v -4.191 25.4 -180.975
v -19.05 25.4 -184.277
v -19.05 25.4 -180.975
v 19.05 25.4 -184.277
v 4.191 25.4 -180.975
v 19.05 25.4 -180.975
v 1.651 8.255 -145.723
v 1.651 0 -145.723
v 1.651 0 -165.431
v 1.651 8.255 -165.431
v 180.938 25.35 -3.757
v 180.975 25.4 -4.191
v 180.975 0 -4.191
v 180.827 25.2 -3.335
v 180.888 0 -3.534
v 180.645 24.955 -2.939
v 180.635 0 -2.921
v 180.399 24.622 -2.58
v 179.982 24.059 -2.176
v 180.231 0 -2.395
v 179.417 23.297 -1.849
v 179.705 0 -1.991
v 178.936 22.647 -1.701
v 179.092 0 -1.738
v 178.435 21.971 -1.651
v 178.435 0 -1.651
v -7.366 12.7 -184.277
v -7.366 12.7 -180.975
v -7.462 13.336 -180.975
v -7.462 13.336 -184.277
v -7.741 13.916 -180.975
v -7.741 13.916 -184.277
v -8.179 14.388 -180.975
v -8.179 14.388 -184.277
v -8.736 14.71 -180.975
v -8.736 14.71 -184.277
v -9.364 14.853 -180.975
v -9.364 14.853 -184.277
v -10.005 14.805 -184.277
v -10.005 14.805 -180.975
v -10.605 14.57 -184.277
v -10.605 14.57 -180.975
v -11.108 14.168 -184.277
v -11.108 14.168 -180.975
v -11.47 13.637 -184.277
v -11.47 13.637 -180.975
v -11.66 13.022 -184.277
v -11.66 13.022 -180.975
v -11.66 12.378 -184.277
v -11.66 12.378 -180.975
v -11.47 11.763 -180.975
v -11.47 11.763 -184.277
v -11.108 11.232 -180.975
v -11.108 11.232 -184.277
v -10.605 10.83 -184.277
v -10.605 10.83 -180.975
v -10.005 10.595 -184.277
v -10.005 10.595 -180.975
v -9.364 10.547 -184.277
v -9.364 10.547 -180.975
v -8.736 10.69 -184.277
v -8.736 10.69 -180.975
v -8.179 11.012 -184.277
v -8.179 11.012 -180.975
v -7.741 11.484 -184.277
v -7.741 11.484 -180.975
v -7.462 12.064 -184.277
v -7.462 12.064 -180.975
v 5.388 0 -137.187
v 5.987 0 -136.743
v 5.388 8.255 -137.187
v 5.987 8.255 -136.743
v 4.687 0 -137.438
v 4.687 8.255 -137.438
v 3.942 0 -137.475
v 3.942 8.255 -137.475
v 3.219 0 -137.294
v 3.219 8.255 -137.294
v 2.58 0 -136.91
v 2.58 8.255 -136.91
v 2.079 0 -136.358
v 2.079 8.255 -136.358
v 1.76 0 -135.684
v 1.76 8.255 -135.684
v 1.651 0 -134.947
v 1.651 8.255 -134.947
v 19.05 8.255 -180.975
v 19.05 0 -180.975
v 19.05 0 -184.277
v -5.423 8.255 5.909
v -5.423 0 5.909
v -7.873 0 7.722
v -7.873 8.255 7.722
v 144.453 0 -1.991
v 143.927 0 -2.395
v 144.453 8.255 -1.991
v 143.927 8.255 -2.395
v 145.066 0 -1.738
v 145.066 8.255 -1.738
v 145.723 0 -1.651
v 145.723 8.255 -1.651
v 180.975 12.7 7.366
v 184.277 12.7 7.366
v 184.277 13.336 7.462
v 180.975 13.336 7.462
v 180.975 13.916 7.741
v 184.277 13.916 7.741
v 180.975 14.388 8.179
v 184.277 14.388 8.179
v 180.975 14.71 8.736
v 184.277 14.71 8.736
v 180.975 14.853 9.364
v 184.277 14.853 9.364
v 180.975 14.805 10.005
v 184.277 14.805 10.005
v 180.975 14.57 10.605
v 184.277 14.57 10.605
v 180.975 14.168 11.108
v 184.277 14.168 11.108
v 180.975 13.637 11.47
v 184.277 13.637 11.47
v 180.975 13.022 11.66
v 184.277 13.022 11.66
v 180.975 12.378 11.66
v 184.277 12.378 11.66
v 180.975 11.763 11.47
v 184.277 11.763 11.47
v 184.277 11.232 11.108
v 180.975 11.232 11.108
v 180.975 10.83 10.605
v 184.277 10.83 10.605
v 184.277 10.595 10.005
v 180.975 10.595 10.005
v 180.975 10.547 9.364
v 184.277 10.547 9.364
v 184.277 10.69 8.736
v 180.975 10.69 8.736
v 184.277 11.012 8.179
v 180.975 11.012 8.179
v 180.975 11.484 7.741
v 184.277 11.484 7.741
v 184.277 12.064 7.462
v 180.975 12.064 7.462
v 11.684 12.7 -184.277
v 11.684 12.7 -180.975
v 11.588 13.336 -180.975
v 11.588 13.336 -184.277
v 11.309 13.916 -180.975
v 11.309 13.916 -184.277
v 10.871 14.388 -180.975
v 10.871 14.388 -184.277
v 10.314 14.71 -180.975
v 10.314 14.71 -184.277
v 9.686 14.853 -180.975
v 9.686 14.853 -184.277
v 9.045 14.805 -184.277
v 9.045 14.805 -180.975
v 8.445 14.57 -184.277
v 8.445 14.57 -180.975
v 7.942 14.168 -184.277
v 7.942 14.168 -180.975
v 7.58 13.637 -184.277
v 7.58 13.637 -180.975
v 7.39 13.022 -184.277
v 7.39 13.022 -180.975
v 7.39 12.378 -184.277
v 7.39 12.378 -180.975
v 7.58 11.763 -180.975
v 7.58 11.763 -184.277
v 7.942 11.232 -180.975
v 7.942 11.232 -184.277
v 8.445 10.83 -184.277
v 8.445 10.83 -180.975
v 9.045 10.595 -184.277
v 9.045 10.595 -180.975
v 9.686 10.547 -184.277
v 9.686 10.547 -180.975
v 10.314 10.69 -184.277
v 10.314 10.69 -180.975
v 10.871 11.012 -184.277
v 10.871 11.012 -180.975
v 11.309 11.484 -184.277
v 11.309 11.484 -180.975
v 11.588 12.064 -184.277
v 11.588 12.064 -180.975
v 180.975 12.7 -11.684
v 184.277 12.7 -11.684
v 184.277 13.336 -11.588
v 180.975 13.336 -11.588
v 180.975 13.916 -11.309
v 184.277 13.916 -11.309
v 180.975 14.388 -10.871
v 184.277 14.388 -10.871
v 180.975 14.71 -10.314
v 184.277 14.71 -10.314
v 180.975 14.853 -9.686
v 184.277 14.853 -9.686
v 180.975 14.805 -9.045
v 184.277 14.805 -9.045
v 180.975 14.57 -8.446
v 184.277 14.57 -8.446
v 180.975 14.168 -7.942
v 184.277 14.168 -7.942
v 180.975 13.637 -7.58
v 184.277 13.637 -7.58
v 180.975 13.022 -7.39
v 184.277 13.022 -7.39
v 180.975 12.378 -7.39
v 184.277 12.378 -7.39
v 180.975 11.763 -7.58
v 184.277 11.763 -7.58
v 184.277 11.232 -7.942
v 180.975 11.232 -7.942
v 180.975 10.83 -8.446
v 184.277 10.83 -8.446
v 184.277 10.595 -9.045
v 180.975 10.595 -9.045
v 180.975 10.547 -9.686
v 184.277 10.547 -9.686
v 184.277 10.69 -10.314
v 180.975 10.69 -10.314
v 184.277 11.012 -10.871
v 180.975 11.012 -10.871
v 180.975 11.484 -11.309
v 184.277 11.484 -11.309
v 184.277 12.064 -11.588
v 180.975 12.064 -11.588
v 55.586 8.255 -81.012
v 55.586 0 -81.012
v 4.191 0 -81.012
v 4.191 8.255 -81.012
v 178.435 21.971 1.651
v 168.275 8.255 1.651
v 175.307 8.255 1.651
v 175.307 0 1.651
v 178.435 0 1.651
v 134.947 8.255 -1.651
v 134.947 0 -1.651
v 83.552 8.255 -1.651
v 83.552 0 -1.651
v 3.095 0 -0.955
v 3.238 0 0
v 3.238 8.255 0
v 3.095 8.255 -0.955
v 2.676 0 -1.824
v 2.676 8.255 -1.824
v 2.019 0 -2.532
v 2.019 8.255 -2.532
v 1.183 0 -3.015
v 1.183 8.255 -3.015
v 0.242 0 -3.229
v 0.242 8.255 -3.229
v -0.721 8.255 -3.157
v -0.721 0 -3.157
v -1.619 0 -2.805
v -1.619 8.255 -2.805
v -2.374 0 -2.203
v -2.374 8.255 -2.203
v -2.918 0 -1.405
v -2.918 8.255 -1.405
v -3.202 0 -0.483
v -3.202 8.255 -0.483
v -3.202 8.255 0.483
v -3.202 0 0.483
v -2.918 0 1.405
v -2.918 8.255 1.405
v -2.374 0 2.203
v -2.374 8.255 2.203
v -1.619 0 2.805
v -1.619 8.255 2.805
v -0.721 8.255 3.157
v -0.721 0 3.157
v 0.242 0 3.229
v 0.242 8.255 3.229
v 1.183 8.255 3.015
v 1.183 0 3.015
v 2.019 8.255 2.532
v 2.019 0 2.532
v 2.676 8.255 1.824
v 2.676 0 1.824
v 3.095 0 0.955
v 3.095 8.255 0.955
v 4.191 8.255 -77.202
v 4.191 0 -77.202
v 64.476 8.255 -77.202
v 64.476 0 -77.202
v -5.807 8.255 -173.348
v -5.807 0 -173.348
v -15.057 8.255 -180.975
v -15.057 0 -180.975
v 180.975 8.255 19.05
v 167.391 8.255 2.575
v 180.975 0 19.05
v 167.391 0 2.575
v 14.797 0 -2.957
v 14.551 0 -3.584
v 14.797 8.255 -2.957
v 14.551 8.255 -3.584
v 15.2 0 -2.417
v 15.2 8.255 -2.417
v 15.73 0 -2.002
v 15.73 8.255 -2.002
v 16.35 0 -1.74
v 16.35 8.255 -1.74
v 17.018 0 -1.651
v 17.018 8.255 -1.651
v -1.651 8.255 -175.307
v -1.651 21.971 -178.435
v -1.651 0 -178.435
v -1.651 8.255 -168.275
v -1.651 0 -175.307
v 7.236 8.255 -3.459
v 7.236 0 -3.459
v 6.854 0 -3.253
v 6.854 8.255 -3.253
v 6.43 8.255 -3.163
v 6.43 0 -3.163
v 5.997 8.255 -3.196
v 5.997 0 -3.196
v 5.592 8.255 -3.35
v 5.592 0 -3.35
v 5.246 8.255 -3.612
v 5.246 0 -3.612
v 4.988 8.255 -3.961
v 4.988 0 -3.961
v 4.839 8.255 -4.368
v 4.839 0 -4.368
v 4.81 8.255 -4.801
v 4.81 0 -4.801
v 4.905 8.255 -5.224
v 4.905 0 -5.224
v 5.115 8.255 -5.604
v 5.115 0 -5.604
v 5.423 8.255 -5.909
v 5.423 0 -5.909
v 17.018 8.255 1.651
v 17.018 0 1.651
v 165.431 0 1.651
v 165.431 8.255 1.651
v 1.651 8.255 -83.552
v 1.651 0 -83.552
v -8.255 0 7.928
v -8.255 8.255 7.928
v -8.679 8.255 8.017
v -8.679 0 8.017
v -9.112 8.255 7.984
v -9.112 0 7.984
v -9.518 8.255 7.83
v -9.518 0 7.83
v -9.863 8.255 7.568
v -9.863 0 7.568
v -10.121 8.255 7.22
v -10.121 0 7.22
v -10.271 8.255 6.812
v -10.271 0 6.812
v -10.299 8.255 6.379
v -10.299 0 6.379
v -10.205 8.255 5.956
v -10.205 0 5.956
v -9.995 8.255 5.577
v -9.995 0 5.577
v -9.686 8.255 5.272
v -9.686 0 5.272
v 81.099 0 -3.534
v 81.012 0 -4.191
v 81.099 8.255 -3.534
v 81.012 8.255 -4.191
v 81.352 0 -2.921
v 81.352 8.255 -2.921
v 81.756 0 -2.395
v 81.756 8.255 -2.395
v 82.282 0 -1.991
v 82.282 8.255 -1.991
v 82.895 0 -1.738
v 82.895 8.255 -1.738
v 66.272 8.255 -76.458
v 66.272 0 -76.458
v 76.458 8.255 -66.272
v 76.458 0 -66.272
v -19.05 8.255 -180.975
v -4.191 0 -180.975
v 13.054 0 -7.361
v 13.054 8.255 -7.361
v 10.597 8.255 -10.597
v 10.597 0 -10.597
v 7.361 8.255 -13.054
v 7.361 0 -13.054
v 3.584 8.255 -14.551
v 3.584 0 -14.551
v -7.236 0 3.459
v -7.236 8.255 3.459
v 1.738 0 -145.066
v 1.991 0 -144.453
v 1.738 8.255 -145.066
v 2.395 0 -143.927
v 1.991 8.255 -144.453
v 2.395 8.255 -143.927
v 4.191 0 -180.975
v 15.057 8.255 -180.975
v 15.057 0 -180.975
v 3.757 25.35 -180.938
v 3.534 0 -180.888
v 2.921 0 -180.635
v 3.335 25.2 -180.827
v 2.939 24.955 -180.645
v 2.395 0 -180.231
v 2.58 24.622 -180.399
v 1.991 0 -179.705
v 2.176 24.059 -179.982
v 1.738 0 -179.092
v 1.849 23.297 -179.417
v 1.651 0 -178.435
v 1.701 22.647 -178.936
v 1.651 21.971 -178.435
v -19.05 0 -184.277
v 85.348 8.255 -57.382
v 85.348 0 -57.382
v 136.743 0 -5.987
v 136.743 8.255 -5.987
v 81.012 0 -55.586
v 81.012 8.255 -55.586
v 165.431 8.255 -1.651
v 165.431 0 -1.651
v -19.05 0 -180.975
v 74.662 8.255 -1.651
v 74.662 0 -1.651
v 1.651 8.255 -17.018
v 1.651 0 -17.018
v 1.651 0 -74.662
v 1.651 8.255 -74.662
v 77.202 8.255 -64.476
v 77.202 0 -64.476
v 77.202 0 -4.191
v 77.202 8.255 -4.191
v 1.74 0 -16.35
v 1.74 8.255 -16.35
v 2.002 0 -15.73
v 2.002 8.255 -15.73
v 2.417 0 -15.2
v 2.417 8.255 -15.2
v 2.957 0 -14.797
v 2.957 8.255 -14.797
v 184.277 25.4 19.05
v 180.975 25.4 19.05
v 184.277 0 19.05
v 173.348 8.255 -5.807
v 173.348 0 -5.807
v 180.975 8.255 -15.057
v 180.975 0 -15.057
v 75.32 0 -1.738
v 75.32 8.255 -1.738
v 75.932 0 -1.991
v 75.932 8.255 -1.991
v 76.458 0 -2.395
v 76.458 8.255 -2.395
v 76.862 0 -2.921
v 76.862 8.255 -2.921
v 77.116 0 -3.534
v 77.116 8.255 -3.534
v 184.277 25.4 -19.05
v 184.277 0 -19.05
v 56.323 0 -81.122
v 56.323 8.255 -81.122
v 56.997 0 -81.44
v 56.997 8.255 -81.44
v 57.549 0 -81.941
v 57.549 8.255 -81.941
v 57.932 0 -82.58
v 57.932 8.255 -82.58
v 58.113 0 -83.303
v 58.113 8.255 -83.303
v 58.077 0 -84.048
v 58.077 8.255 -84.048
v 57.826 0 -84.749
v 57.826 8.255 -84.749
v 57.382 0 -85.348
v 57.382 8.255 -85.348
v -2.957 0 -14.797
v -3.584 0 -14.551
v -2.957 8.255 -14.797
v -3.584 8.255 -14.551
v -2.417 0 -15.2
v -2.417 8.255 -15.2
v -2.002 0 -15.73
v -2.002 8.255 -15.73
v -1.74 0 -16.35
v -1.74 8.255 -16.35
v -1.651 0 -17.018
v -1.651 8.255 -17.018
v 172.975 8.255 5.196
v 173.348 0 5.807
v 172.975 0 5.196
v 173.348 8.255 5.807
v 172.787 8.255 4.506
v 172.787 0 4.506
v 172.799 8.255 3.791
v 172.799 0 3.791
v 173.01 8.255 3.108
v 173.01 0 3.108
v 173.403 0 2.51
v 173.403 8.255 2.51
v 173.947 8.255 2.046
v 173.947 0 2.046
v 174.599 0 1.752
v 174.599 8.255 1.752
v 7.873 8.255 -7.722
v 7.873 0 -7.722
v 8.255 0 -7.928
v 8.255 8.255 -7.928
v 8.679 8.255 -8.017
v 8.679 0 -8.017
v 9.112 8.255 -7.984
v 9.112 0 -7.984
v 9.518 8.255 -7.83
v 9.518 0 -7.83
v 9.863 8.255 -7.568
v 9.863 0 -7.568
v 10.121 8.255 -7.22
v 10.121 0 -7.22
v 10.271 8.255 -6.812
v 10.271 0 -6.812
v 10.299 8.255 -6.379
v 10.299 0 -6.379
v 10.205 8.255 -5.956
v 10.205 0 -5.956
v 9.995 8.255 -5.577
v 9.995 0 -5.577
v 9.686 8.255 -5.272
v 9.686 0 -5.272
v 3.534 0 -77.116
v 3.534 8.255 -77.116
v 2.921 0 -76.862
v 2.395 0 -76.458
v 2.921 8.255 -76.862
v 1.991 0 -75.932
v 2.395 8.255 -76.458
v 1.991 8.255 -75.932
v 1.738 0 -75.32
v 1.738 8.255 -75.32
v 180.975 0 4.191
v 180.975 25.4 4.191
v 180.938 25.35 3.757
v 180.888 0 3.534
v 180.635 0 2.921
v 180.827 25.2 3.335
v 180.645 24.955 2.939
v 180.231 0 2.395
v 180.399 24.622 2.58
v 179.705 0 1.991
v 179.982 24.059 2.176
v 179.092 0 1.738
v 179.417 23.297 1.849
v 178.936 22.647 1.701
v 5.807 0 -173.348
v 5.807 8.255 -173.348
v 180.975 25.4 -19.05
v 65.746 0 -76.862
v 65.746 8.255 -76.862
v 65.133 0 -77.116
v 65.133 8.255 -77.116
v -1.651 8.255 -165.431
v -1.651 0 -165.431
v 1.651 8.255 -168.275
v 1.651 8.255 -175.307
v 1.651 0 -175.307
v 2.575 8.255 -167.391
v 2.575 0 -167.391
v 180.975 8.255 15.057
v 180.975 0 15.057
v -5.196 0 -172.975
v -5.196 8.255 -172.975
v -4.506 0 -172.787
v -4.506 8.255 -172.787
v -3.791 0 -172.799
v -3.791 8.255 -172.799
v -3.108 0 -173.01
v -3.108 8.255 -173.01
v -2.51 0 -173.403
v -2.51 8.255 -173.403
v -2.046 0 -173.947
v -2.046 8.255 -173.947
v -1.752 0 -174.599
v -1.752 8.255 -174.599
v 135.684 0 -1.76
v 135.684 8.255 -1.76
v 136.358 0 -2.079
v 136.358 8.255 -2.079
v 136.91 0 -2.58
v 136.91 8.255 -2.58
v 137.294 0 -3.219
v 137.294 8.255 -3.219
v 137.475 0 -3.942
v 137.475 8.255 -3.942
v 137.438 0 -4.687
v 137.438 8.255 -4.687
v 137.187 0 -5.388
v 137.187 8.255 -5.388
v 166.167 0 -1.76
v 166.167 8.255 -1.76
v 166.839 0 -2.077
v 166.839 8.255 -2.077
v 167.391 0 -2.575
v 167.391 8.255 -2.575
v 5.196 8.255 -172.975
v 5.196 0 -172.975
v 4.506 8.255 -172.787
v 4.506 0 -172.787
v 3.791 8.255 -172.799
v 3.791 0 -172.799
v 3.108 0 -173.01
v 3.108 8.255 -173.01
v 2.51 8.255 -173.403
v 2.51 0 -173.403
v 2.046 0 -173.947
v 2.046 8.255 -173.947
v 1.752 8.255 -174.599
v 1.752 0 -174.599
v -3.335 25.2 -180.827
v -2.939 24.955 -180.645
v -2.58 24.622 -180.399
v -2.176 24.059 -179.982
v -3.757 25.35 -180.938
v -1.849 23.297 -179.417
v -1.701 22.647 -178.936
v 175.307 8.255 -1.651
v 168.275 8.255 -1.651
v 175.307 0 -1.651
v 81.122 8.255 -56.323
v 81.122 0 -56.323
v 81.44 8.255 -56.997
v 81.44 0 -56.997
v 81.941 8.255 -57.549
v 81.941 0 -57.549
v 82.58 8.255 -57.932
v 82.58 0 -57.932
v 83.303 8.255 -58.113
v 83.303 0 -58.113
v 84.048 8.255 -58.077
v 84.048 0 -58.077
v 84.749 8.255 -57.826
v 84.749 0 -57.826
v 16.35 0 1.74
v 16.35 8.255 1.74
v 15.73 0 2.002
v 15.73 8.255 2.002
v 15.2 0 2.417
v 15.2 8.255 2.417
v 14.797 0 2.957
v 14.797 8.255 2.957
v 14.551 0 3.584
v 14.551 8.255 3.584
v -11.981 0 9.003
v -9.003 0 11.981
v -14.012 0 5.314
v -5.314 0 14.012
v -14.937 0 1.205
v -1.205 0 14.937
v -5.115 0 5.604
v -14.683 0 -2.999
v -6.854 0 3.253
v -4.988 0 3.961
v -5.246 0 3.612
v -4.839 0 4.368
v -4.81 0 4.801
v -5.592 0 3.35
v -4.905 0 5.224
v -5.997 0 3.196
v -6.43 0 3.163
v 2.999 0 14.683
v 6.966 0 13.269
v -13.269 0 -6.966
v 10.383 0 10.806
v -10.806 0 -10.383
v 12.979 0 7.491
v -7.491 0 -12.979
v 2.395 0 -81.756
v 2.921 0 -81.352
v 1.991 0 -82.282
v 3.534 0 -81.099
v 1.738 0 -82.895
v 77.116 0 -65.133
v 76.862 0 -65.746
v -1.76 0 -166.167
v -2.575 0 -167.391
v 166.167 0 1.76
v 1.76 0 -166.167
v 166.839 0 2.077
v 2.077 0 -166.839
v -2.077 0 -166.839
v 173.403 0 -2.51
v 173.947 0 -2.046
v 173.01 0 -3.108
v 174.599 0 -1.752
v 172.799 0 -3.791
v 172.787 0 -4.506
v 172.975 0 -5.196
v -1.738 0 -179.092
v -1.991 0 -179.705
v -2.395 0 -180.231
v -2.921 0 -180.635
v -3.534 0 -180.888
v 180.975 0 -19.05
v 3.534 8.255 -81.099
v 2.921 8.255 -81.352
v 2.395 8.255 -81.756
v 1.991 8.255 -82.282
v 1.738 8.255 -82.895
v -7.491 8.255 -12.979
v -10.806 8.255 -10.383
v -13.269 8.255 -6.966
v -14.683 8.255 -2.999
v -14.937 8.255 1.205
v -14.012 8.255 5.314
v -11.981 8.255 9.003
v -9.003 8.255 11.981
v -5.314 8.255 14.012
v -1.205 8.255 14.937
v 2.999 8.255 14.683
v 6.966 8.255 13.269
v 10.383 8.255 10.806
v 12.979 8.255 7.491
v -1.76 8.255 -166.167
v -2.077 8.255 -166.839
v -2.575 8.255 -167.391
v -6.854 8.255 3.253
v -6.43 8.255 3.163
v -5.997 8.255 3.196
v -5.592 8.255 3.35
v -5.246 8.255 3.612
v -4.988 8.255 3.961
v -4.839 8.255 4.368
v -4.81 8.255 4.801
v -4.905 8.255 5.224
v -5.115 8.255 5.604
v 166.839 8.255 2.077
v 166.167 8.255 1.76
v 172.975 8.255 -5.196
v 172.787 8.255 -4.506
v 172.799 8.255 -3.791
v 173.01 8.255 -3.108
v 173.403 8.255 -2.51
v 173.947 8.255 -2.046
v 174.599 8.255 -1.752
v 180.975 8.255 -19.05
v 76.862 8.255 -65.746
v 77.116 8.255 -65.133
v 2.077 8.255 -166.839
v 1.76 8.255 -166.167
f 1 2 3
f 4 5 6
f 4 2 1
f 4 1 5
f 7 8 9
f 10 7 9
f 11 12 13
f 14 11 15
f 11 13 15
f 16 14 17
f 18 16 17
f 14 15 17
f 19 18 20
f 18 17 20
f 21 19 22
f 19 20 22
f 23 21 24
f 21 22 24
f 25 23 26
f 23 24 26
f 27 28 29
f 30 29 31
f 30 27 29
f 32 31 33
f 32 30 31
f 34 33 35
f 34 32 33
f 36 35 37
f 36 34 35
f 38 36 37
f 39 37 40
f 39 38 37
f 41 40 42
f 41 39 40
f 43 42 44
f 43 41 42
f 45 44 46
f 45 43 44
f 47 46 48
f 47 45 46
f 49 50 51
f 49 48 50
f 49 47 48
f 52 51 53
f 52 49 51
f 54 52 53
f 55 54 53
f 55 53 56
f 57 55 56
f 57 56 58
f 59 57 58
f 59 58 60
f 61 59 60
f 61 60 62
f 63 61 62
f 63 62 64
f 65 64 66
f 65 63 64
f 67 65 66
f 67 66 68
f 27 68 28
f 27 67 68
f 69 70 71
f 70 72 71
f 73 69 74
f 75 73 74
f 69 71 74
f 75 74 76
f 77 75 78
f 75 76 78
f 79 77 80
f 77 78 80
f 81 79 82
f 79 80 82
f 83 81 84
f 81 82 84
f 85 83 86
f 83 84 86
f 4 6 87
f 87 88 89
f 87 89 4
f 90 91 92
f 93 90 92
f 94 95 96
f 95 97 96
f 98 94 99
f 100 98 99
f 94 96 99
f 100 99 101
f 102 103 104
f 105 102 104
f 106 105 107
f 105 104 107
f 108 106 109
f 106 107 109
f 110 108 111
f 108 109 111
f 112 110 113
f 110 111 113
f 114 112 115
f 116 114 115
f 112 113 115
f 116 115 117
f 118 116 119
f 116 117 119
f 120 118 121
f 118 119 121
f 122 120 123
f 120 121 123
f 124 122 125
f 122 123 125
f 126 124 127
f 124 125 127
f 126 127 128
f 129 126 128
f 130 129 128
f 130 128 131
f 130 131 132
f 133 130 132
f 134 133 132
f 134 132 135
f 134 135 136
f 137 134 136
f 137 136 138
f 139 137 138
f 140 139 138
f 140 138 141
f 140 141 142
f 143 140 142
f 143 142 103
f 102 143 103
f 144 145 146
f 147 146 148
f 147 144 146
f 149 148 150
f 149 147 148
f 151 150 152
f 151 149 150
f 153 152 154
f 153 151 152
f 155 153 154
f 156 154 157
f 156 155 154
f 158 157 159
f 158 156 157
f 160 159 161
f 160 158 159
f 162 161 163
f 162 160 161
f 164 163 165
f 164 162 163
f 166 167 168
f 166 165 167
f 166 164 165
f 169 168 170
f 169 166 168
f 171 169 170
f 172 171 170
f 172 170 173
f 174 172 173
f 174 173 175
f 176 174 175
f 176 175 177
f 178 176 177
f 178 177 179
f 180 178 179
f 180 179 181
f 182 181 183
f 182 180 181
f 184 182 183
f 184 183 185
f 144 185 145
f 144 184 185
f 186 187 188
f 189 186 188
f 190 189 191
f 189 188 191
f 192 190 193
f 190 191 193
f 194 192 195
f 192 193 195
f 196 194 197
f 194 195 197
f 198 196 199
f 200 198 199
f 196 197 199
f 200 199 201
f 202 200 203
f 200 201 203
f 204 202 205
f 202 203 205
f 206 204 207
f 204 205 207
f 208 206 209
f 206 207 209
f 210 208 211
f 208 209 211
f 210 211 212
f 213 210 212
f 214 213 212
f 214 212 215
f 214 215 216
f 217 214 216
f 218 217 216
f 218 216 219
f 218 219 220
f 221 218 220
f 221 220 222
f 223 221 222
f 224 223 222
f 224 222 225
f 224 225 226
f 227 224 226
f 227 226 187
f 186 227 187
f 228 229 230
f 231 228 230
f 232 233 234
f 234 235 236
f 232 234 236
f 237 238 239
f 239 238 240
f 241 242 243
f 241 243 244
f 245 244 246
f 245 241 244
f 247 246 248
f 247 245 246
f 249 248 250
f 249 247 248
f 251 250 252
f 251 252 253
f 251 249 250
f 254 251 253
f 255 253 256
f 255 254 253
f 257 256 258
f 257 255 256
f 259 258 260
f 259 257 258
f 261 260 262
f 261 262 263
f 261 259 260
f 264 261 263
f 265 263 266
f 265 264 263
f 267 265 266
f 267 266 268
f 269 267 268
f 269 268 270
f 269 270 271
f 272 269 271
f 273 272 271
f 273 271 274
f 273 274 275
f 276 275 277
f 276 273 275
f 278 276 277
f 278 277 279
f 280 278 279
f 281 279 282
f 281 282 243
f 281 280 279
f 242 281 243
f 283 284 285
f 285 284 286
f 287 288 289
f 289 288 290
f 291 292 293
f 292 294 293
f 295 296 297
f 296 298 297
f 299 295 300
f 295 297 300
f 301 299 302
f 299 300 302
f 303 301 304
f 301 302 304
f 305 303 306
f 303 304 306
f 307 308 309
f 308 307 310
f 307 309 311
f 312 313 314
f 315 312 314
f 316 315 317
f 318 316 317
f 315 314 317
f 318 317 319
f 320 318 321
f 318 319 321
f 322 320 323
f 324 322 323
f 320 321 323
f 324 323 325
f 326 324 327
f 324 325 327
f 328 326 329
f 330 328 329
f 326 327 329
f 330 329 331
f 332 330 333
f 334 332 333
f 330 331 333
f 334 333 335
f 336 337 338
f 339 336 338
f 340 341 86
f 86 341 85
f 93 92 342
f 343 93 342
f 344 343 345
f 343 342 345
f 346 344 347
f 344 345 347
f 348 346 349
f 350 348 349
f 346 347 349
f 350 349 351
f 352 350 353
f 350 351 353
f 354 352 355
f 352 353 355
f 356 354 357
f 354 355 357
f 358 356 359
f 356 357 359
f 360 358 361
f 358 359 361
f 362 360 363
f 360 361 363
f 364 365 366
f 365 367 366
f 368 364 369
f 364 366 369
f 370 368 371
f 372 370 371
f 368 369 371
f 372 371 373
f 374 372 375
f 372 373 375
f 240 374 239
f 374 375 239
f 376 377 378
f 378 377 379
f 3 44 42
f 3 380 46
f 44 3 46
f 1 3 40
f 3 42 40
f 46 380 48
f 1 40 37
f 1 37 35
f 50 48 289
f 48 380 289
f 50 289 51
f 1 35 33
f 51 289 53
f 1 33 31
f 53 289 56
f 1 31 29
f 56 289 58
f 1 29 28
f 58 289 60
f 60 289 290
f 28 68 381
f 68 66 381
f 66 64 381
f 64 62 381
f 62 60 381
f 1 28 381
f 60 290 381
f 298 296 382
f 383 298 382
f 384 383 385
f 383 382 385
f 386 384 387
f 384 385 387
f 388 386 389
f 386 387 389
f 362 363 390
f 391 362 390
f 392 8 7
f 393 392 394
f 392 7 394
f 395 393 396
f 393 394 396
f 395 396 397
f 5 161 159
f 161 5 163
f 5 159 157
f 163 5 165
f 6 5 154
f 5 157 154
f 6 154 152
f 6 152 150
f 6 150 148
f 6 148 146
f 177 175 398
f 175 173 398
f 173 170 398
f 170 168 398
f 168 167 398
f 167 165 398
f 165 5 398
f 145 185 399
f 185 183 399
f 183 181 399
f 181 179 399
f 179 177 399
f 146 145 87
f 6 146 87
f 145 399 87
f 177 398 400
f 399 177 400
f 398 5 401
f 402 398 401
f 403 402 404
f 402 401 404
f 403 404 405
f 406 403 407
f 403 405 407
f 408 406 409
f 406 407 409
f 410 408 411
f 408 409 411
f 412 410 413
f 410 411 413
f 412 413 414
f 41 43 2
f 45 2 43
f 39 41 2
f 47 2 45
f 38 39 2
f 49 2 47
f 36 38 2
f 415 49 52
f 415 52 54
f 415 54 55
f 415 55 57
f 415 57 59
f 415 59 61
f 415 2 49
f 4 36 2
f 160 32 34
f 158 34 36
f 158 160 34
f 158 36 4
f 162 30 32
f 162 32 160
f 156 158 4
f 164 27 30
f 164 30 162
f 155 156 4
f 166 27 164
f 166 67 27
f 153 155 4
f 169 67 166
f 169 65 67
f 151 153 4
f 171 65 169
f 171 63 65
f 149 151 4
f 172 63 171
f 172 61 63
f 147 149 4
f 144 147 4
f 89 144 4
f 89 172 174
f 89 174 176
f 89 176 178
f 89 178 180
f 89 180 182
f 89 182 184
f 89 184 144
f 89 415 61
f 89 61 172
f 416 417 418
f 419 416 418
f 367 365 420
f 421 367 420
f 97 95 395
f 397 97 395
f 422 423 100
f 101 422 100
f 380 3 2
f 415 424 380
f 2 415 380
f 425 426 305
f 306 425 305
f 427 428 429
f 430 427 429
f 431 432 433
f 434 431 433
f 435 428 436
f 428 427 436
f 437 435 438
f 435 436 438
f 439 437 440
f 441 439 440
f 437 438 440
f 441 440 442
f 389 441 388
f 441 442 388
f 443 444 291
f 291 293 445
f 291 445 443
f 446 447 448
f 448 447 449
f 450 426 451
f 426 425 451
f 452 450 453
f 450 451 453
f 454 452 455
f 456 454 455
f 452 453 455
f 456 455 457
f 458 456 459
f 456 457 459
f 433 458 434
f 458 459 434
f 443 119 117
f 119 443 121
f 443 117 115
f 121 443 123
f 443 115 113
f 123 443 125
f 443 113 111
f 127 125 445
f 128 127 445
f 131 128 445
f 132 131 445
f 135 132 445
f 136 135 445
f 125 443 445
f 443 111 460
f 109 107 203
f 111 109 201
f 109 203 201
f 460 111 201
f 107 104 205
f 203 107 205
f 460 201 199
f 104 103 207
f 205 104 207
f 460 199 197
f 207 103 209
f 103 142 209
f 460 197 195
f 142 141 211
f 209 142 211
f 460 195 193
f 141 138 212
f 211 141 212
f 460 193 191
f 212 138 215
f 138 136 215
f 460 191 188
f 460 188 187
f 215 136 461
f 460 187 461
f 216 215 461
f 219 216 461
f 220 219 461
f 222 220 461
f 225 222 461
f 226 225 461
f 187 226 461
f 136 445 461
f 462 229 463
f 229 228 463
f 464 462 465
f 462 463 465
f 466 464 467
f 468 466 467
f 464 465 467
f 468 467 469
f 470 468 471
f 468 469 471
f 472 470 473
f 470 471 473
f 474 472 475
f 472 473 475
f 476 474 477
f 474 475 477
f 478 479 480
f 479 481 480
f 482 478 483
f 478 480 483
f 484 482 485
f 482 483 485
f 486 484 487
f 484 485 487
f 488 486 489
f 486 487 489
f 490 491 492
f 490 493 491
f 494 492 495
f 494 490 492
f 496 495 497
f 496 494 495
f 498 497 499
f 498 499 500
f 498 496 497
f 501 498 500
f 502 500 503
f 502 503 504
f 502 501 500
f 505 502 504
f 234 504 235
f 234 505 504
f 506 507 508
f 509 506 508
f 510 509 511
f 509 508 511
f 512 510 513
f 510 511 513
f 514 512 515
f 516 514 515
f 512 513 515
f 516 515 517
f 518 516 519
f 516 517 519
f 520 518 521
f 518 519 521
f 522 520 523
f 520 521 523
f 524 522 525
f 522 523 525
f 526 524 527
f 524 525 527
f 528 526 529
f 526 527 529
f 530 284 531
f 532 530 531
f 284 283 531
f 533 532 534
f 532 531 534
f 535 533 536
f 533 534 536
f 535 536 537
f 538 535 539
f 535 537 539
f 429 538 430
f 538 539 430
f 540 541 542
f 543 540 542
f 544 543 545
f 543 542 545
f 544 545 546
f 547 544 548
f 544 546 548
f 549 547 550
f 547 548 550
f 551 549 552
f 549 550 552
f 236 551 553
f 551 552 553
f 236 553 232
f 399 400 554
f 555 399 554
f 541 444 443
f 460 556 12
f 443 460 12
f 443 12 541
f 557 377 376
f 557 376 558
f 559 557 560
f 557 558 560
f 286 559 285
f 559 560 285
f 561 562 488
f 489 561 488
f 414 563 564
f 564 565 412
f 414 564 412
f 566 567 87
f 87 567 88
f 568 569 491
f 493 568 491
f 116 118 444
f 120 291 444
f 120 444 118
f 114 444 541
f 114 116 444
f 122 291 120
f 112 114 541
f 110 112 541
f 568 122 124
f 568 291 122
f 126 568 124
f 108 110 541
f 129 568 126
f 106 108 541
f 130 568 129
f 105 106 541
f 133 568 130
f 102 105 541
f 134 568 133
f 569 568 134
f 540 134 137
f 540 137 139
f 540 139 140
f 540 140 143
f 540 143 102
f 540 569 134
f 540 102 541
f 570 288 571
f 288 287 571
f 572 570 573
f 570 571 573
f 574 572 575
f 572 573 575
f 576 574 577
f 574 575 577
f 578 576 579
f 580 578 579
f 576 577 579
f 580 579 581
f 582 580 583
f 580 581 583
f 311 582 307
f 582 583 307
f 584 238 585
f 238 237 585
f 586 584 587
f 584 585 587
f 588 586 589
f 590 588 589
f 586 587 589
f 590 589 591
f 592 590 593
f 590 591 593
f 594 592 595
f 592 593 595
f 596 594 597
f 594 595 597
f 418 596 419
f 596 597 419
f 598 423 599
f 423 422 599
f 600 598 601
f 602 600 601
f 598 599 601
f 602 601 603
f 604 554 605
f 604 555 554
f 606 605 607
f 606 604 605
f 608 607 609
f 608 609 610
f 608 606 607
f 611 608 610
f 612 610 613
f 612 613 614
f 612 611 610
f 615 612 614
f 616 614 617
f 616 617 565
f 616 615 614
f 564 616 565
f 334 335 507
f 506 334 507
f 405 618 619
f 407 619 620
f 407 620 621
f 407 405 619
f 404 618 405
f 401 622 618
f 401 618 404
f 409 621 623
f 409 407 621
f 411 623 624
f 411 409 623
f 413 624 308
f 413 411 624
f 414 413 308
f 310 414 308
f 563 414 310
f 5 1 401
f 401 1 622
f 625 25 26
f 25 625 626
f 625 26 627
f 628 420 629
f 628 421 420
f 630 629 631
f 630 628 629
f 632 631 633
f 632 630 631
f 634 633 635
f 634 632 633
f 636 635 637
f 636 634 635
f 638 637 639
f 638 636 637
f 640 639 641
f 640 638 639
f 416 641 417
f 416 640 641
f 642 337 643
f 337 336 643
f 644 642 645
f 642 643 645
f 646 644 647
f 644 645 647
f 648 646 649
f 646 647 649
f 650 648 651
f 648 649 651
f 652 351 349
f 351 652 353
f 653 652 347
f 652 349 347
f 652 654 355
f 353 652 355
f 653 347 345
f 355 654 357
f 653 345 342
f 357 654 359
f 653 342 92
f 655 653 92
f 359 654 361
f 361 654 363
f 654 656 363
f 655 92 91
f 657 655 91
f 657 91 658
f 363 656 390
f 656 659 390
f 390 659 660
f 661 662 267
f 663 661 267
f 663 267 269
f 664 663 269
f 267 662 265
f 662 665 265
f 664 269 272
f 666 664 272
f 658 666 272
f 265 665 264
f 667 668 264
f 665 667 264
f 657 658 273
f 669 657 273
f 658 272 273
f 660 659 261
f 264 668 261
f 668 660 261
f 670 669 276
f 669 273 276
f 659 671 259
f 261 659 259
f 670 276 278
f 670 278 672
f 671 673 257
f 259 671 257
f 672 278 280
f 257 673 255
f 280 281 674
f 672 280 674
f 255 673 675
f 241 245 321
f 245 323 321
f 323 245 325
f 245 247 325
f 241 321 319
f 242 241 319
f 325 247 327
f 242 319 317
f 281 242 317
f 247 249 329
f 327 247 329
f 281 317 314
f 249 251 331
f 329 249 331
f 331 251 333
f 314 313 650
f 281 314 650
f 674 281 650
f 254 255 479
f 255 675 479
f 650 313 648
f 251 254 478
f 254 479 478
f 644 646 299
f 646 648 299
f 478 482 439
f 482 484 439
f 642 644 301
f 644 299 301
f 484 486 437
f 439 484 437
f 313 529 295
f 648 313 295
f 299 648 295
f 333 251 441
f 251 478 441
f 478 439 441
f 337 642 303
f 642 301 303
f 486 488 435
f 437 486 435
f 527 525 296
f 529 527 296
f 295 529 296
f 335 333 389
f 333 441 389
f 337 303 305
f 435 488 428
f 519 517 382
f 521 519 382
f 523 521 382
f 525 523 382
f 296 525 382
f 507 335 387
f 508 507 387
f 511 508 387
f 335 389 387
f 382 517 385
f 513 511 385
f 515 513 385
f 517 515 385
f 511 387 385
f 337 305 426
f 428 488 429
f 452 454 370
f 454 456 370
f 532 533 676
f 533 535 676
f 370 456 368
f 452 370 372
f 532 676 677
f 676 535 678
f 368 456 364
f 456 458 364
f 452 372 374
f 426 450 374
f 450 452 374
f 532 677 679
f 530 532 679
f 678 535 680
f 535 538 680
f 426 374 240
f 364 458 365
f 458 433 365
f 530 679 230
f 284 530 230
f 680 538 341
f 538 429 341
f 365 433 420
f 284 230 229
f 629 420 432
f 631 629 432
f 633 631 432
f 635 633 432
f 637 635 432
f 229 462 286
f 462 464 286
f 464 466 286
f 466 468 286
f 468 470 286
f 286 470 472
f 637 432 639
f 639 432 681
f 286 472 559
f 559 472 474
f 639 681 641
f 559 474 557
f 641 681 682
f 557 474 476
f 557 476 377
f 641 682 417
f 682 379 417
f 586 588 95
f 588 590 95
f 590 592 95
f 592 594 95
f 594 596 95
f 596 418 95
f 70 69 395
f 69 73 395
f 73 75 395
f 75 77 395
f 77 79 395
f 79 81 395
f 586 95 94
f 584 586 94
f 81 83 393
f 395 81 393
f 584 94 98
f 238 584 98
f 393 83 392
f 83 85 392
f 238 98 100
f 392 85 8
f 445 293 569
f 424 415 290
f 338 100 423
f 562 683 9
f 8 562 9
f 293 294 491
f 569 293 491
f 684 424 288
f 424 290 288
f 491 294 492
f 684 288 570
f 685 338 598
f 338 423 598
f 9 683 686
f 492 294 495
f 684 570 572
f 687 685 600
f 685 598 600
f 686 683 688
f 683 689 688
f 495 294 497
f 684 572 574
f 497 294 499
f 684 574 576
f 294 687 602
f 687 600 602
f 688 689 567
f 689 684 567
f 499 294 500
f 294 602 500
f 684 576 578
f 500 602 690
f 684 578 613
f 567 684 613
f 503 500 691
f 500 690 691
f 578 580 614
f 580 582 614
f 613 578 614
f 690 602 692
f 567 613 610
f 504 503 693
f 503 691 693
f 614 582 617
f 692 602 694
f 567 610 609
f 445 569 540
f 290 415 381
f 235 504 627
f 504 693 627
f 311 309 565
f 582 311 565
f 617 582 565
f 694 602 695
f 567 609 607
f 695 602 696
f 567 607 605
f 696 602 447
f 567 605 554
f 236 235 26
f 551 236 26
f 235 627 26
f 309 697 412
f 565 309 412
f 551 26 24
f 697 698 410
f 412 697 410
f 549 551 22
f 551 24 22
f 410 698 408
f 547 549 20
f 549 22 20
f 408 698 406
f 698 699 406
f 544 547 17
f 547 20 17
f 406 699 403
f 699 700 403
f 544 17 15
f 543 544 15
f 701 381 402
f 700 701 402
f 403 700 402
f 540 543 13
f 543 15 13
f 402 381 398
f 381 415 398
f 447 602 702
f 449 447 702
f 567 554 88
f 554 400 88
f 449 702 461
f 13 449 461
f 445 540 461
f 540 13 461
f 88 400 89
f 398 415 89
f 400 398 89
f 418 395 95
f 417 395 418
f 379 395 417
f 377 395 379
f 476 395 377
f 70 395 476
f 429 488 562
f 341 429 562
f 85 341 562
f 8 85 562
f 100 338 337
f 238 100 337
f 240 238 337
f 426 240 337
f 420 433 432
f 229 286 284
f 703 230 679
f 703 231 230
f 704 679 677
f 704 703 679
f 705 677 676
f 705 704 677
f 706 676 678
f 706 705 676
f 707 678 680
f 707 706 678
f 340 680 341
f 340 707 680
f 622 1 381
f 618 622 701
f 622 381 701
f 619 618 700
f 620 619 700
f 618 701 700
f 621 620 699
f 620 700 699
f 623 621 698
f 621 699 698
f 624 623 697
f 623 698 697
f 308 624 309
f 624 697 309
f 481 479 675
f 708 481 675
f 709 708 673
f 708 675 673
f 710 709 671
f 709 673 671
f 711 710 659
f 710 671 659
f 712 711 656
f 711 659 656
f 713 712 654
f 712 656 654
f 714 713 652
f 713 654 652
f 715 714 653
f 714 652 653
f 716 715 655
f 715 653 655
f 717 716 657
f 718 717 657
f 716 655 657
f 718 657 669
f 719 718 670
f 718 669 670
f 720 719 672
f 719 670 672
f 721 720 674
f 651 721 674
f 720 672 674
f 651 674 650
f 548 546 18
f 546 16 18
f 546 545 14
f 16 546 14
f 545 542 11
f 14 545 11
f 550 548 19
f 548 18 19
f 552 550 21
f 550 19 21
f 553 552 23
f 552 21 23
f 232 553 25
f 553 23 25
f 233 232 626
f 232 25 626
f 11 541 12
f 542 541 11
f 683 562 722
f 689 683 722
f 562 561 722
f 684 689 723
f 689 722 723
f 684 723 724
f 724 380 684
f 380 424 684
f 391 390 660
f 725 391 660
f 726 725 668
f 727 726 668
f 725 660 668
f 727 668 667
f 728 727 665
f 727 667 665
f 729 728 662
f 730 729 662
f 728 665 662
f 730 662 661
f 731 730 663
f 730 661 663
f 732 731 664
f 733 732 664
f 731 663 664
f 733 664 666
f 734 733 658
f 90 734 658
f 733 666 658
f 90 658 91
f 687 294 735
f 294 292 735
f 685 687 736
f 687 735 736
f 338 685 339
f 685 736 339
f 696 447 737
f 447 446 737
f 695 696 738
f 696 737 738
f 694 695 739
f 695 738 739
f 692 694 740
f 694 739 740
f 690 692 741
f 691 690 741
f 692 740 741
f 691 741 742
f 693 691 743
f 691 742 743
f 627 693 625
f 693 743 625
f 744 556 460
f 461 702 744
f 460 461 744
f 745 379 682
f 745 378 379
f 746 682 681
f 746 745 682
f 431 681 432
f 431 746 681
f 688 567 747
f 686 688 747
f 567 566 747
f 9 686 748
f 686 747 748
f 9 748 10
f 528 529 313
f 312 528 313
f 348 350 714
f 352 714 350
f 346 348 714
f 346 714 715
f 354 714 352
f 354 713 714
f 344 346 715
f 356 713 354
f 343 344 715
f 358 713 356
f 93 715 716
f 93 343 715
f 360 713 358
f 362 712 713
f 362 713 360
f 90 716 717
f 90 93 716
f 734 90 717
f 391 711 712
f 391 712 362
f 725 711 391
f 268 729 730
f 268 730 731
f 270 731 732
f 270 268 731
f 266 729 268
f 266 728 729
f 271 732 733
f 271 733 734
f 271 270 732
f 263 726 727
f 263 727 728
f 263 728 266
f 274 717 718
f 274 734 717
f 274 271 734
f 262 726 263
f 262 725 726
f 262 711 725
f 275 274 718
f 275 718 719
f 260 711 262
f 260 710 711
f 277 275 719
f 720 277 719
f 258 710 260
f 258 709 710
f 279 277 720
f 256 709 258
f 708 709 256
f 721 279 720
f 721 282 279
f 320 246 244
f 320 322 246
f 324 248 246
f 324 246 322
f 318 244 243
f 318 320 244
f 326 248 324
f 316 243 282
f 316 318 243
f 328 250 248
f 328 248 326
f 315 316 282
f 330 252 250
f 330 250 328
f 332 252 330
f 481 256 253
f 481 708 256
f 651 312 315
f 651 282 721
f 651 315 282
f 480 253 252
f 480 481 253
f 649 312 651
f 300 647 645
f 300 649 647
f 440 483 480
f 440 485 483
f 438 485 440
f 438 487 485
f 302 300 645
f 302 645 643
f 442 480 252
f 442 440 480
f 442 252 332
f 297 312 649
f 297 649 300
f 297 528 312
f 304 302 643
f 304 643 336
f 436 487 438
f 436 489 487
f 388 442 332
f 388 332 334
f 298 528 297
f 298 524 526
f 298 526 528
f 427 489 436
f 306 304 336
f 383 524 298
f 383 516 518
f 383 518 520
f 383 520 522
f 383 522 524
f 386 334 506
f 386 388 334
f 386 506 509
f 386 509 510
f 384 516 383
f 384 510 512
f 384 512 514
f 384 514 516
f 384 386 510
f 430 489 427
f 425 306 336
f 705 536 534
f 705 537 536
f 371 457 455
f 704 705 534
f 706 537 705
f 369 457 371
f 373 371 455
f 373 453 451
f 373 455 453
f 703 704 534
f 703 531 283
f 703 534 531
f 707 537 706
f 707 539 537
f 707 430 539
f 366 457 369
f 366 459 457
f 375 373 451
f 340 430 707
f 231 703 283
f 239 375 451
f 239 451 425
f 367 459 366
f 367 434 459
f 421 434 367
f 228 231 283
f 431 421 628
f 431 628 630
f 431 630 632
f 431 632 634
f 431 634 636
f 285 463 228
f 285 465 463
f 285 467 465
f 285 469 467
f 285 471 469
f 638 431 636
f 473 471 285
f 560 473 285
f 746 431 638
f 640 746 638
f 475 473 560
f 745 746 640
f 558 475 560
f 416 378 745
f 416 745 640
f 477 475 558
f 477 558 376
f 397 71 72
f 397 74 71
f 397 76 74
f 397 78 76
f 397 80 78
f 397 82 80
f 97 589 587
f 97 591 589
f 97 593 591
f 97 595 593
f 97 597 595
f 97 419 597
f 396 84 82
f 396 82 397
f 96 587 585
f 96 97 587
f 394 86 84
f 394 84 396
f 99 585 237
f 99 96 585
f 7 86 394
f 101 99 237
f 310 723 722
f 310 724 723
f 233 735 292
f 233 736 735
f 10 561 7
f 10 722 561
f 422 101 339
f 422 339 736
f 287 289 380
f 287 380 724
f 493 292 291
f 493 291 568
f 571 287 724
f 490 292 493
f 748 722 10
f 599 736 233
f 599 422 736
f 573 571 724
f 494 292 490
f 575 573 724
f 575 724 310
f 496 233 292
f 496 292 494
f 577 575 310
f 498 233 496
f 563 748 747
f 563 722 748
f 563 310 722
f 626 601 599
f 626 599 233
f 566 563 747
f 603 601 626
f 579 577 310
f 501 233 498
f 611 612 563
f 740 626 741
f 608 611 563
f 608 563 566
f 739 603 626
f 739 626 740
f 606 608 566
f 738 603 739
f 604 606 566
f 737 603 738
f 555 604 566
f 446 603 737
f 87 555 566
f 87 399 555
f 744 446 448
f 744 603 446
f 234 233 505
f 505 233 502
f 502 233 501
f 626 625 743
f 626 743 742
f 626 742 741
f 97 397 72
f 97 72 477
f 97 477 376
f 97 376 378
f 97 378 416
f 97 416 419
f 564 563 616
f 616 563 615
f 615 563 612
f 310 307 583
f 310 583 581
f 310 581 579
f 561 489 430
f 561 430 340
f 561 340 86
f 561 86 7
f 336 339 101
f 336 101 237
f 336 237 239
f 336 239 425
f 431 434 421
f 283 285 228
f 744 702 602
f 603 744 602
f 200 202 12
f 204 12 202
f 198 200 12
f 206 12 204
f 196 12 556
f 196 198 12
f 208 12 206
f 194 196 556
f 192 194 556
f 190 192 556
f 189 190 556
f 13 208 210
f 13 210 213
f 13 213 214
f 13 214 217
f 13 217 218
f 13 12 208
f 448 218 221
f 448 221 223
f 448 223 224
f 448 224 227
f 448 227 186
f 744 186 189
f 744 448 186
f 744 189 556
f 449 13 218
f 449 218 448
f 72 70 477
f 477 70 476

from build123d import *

# Parameters (mm, degrees)
SKETCH1_R           = 3.2385
BOSS_EXTRUDE1_DEPTH = 8.255
SKETCH3_W           = 3.302
SKETCH3_H           = 38.1
SKETCH3_W_2         = 38.1
SKETCH3_H_2         = 3.302
BOSS_EXTRUDE3_DEPTH = 25.4
SKETCH5_R           = 2.159
CUT_EXTRUDE1_DEPTH  = 204.327
SKETCH6_W           = 12.7
SKETCH6_H           = 3.302
BOSS_EXTRUDE5_DEPTH = 25.4
CUT_EXTRUDE2_DEPTH  = 25.4
SKETCH8_W           = 3.302
SKETCH8_H           = 12.7
BOSS_EXTRUDE6_DEPTH = 25.4
CUT_EXTRUDE3_DEPTH  = 25.4
FILLET1_R           = 2.54


with BuildPart() as part:
    # Sketch1 → Boss-Extrude1 (new body)
    with BuildSketch(Plane(origin=(0, 0, 0), x_dir=(1, 0, 0), z_dir=(0, 1, 0))):
        with BuildLine():
            Line((-1.651, 166.628963684), (-1.651, 14.89477744))
            ThreePointArc((-1.651, 14.89477744), (-10.596702223, -10.596702223), (14.89477744, -1.651))
            Line((14.89477744, -1.651), (166.628963684, -1.651))
            Line((166.628963684, -1.651), (180.975, -19.05))
            Line((180.975, -19.05), (180.975, -15.057345133))
            Line((180.975, -15.057345133), (169.921036316, -1.651))
            Line((169.921036316, -1.651), (180.975, -1.651))
            Line((180.975, -1.651), (180.975, 1.651))
            Line((180.975, 1.651), (169.921036316, 1.651))
            Line((169.921036316, 1.651), (180.975, 15.057345133))
            Line((180.975, 15.057345133), (180.975, 19.05))
            Line((180.975, 19.05), (166.628963684, 1.651))
            Line((166.628963684, 1.651), (144.671051224, 1.651))
            Line((144.671051224, 1.651), (1.651, 144.671051224))
            Line((1.651, 144.671051224), (1.651, 166.628963684))
            Line((1.651, 166.628963684), (19.05, 180.975))
            Line((19.05, 180.975), (15.057345133, 180.975))
            Line((15.057345133, 180.975), (1.651, 169.921036316))
            Line((1.651, 169.921036316), (1.651, 180.975))
            Line((1.651, 180.975), (-1.651, 180.975))
            Line((-1.651, 180.975), (-1.651, 169.921036316))
            Line((-1.651, 169.921036316), (-15.057345133, 180.975))
            Line((-15.057345133, 180.975), (-19.05, 180.975))
            Line((-19.05, 180.975), (-1.651, 166.628963684))
        make_face()
        with BuildLine():
            Line((-9.686234559, -5.271576621), (-7.236078848, -3.458556767))
            ThreePointArc((-7.236078848, -3.458556767), (-5.104491065, -3.777124696), (-5.423058993, -5.908712478))
            Line((-5.423058993, -5.908712478), (-7.873214705, -7.721732332))
            ThreePointArc((-7.873214705, -7.721732332), (-10.004802487, -7.403164404), (-9.686234559, -5.271576621))
        make_face(mode=Mode.SUBTRACT)
        Circle(SKETCH1_R, mode=Mode.SUBTRACT)
        with BuildLine():
            ThreePointArc((7.236078848, 3.458556767), (5.104491065, 3.777124696), (5.423058993, 5.908712478))
            Line((5.423058993, 5.908712478), (7.873214705, 7.721732332))
            ThreePointArc((7.873214705, 7.721732332), (10.004802487, 7.403164404), (9.686234559, 5.271576621))
            Line((9.686234559, 5.271576621), (7.236078848, 3.458556767))
        make_face(mode=Mode.SUBTRACT)
        with BuildLine():
            Line((77.202140867, 1.651), (14.89477744, 1.651))
            ThreePointArc((14.89477744, 1.651), (10.596702223, 10.596702223), (1.651, 14.89477744))
            Line((1.651, 14.89477744), (1.651, 77.202140867))
            Line((1.651, 77.202140867), (65.527807909, 77.202140867))
            Line((65.527807909, 77.202140867), (77.202140867, 65.527807909))
            Line((77.202140867, 65.527807909), (77.202140867, 1.651))
        make_face(mode=Mode.SUBTRACT)
        Polygon((141.078948776, 1.651), (81.012140867, 1.651), (81.012140867, 61.717807909), align=None, mode=Mode.SUBTRACT)
        Polygon((1.651, 81.012140867), (1.651, 141.078948776), (61.717807909, 81.012140867), align=None, mode=Mode.SUBTRACT)
    extrude(amount=BOSS_EXTRUDE1_DEPTH)

    # Sketch3 → Boss-Extrude3 (add)
    with BuildSketch(Plane(origin=(0, 0, 0), x_dir=(1, 0, 0), z_dir=(0, 1, 0))):
        with Locations((182.626, 0)):
            Rectangle(SKETCH3_W, SKETCH3_H)
        with Locations((0, 182.626)):
            Rectangle(SKETCH3_W_2, SKETCH3_H_2)
    extrude(amount=BOSS_EXTRUDE3_DEPTH)

    # Sketch5 → Cut-Extrude1 (cut, through all)
    with BuildSketch(Plane(origin=(184.277, 0, 0), x_dir=(0, 0, -1), z_dir=(1, 0, 0))):
        with Locations((-9.525, 12.7)):
            Circle(SKETCH5_R)
        with Locations((9.525, 12.7)):
            Circle(SKETCH5_R)
    cut_extrude1 = extrude(amount=-CUT_EXTRUDE1_DEPTH, mode=Mode.SUBTRACT)

    # Mirror1: Cut-Extrude1 across plane
    add(cut_extrude1.mirror(Plane(origin=(0, 0, 0), x_dir=(-0.707106781, 0, 0.707106781), z_dir=(0.707106781, 0, 0.707106781))), mode=Mode.SUBTRACT)

    # Sketch6 → Boss-Extrude5 (add)
    with BuildSketch(Plane(origin=(0, 0, 0), x_dir=(1, 0, 0), z_dir=(0, 1, 0))):
        with Locations((174.625, 0)):
            Rectangle(SKETCH6_W, SKETCH6_H)
    extrude(amount=BOSS_EXTRUDE5_DEPTH)

    # Sketch7 → Cut-Extrude2 (cut)
    with BuildSketch(Plane(origin=(0, 0, -1.651), x_dir=(-1, 0, 0), z_dir=(0, 0, -1))):
        Polygon((-180.975, 25.4), (-168.275, 8.255), (-168.275, 25.4), align=None)
    extrude(amount=-CUT_EXTRUDE2_DEPTH, mode=Mode.SUBTRACT)

    # Sketch8 → Boss-Extrude6 (add)
    with BuildSketch(Plane(origin=(0, 0, 0), x_dir=(1, 0, 0), z_dir=(0, 1, 0))):
        with Locations((0, 174.625)):
            Rectangle(SKETCH8_W, SKETCH8_H)
    extrude(amount=BOSS_EXTRUDE6_DEPTH)

    # Sketch9 → Cut-Extrude3 (cut)
    with BuildSketch(Plane(origin=(1.651, 0, 0), x_dir=(0, 0, -1), z_dir=(1, 0, 0))):
        Polygon((180.975, 25.4), (168.275, 8.255), (168.275, 25.4), align=None)
    extrude(amount=-CUT_EXTRUDE3_DEPTH, mode=Mode.SUBTRACT)

    # Fillet1
    fillet1_edges = [part.edges().sort_by_distance(p)[0] for p in [
        (-1.651, 4.1275, -166.628963684),
        (-1.651, 4.1275, -169.921036316),
        (-1.651, 12.7, -180.975),
        (1.651, 12.7, -180.975),
        (1.651, 4.1275, -169.921036316),
        (1.651, 4.1275, -166.628963684),
        (1.651, 4.1275, -144.671051224),
        (144.671051224, 4.1275, -1.651),
        (166.628963684, 4.1275, -1.651),
        (169.921036316, 4.1275, -1.651),
        (180.975, 12.7, -1.651),
        (180.975, 12.7, 1.651),
        (169.921036316, 4.1275, 1.651),
        (166.628963684, 4.1275, 1.651),
        (14.89477744, 4.1275, 1.651),
        (-1.651, 4.1275, -14.89477744),
        (61.717807909, 4.1275, -81.012140867),
        (1.651, 4.1275, -141.078948776),
        (1.651, 4.1275, -81.012140867),
        (77.202140867, 4.1275, -1.651),
        (77.202140867, 4.1275, -65.527807909),
        (65.527807909, 4.1275, -77.202140867),
        (1.651, 4.1275, -77.202140867),
        (1.651, 4.1275, -14.89477744),
        (14.89477744, 4.1275, -1.651),
        (141.078948776, 4.1275, -1.651),
        (81.012140867, 4.1275, -61.717807909),
        (81.012140867, 4.1275, -1.651),
    ]]
    fillet(fillet1_edges, radius=FILLET1_R)


solid = part.part
